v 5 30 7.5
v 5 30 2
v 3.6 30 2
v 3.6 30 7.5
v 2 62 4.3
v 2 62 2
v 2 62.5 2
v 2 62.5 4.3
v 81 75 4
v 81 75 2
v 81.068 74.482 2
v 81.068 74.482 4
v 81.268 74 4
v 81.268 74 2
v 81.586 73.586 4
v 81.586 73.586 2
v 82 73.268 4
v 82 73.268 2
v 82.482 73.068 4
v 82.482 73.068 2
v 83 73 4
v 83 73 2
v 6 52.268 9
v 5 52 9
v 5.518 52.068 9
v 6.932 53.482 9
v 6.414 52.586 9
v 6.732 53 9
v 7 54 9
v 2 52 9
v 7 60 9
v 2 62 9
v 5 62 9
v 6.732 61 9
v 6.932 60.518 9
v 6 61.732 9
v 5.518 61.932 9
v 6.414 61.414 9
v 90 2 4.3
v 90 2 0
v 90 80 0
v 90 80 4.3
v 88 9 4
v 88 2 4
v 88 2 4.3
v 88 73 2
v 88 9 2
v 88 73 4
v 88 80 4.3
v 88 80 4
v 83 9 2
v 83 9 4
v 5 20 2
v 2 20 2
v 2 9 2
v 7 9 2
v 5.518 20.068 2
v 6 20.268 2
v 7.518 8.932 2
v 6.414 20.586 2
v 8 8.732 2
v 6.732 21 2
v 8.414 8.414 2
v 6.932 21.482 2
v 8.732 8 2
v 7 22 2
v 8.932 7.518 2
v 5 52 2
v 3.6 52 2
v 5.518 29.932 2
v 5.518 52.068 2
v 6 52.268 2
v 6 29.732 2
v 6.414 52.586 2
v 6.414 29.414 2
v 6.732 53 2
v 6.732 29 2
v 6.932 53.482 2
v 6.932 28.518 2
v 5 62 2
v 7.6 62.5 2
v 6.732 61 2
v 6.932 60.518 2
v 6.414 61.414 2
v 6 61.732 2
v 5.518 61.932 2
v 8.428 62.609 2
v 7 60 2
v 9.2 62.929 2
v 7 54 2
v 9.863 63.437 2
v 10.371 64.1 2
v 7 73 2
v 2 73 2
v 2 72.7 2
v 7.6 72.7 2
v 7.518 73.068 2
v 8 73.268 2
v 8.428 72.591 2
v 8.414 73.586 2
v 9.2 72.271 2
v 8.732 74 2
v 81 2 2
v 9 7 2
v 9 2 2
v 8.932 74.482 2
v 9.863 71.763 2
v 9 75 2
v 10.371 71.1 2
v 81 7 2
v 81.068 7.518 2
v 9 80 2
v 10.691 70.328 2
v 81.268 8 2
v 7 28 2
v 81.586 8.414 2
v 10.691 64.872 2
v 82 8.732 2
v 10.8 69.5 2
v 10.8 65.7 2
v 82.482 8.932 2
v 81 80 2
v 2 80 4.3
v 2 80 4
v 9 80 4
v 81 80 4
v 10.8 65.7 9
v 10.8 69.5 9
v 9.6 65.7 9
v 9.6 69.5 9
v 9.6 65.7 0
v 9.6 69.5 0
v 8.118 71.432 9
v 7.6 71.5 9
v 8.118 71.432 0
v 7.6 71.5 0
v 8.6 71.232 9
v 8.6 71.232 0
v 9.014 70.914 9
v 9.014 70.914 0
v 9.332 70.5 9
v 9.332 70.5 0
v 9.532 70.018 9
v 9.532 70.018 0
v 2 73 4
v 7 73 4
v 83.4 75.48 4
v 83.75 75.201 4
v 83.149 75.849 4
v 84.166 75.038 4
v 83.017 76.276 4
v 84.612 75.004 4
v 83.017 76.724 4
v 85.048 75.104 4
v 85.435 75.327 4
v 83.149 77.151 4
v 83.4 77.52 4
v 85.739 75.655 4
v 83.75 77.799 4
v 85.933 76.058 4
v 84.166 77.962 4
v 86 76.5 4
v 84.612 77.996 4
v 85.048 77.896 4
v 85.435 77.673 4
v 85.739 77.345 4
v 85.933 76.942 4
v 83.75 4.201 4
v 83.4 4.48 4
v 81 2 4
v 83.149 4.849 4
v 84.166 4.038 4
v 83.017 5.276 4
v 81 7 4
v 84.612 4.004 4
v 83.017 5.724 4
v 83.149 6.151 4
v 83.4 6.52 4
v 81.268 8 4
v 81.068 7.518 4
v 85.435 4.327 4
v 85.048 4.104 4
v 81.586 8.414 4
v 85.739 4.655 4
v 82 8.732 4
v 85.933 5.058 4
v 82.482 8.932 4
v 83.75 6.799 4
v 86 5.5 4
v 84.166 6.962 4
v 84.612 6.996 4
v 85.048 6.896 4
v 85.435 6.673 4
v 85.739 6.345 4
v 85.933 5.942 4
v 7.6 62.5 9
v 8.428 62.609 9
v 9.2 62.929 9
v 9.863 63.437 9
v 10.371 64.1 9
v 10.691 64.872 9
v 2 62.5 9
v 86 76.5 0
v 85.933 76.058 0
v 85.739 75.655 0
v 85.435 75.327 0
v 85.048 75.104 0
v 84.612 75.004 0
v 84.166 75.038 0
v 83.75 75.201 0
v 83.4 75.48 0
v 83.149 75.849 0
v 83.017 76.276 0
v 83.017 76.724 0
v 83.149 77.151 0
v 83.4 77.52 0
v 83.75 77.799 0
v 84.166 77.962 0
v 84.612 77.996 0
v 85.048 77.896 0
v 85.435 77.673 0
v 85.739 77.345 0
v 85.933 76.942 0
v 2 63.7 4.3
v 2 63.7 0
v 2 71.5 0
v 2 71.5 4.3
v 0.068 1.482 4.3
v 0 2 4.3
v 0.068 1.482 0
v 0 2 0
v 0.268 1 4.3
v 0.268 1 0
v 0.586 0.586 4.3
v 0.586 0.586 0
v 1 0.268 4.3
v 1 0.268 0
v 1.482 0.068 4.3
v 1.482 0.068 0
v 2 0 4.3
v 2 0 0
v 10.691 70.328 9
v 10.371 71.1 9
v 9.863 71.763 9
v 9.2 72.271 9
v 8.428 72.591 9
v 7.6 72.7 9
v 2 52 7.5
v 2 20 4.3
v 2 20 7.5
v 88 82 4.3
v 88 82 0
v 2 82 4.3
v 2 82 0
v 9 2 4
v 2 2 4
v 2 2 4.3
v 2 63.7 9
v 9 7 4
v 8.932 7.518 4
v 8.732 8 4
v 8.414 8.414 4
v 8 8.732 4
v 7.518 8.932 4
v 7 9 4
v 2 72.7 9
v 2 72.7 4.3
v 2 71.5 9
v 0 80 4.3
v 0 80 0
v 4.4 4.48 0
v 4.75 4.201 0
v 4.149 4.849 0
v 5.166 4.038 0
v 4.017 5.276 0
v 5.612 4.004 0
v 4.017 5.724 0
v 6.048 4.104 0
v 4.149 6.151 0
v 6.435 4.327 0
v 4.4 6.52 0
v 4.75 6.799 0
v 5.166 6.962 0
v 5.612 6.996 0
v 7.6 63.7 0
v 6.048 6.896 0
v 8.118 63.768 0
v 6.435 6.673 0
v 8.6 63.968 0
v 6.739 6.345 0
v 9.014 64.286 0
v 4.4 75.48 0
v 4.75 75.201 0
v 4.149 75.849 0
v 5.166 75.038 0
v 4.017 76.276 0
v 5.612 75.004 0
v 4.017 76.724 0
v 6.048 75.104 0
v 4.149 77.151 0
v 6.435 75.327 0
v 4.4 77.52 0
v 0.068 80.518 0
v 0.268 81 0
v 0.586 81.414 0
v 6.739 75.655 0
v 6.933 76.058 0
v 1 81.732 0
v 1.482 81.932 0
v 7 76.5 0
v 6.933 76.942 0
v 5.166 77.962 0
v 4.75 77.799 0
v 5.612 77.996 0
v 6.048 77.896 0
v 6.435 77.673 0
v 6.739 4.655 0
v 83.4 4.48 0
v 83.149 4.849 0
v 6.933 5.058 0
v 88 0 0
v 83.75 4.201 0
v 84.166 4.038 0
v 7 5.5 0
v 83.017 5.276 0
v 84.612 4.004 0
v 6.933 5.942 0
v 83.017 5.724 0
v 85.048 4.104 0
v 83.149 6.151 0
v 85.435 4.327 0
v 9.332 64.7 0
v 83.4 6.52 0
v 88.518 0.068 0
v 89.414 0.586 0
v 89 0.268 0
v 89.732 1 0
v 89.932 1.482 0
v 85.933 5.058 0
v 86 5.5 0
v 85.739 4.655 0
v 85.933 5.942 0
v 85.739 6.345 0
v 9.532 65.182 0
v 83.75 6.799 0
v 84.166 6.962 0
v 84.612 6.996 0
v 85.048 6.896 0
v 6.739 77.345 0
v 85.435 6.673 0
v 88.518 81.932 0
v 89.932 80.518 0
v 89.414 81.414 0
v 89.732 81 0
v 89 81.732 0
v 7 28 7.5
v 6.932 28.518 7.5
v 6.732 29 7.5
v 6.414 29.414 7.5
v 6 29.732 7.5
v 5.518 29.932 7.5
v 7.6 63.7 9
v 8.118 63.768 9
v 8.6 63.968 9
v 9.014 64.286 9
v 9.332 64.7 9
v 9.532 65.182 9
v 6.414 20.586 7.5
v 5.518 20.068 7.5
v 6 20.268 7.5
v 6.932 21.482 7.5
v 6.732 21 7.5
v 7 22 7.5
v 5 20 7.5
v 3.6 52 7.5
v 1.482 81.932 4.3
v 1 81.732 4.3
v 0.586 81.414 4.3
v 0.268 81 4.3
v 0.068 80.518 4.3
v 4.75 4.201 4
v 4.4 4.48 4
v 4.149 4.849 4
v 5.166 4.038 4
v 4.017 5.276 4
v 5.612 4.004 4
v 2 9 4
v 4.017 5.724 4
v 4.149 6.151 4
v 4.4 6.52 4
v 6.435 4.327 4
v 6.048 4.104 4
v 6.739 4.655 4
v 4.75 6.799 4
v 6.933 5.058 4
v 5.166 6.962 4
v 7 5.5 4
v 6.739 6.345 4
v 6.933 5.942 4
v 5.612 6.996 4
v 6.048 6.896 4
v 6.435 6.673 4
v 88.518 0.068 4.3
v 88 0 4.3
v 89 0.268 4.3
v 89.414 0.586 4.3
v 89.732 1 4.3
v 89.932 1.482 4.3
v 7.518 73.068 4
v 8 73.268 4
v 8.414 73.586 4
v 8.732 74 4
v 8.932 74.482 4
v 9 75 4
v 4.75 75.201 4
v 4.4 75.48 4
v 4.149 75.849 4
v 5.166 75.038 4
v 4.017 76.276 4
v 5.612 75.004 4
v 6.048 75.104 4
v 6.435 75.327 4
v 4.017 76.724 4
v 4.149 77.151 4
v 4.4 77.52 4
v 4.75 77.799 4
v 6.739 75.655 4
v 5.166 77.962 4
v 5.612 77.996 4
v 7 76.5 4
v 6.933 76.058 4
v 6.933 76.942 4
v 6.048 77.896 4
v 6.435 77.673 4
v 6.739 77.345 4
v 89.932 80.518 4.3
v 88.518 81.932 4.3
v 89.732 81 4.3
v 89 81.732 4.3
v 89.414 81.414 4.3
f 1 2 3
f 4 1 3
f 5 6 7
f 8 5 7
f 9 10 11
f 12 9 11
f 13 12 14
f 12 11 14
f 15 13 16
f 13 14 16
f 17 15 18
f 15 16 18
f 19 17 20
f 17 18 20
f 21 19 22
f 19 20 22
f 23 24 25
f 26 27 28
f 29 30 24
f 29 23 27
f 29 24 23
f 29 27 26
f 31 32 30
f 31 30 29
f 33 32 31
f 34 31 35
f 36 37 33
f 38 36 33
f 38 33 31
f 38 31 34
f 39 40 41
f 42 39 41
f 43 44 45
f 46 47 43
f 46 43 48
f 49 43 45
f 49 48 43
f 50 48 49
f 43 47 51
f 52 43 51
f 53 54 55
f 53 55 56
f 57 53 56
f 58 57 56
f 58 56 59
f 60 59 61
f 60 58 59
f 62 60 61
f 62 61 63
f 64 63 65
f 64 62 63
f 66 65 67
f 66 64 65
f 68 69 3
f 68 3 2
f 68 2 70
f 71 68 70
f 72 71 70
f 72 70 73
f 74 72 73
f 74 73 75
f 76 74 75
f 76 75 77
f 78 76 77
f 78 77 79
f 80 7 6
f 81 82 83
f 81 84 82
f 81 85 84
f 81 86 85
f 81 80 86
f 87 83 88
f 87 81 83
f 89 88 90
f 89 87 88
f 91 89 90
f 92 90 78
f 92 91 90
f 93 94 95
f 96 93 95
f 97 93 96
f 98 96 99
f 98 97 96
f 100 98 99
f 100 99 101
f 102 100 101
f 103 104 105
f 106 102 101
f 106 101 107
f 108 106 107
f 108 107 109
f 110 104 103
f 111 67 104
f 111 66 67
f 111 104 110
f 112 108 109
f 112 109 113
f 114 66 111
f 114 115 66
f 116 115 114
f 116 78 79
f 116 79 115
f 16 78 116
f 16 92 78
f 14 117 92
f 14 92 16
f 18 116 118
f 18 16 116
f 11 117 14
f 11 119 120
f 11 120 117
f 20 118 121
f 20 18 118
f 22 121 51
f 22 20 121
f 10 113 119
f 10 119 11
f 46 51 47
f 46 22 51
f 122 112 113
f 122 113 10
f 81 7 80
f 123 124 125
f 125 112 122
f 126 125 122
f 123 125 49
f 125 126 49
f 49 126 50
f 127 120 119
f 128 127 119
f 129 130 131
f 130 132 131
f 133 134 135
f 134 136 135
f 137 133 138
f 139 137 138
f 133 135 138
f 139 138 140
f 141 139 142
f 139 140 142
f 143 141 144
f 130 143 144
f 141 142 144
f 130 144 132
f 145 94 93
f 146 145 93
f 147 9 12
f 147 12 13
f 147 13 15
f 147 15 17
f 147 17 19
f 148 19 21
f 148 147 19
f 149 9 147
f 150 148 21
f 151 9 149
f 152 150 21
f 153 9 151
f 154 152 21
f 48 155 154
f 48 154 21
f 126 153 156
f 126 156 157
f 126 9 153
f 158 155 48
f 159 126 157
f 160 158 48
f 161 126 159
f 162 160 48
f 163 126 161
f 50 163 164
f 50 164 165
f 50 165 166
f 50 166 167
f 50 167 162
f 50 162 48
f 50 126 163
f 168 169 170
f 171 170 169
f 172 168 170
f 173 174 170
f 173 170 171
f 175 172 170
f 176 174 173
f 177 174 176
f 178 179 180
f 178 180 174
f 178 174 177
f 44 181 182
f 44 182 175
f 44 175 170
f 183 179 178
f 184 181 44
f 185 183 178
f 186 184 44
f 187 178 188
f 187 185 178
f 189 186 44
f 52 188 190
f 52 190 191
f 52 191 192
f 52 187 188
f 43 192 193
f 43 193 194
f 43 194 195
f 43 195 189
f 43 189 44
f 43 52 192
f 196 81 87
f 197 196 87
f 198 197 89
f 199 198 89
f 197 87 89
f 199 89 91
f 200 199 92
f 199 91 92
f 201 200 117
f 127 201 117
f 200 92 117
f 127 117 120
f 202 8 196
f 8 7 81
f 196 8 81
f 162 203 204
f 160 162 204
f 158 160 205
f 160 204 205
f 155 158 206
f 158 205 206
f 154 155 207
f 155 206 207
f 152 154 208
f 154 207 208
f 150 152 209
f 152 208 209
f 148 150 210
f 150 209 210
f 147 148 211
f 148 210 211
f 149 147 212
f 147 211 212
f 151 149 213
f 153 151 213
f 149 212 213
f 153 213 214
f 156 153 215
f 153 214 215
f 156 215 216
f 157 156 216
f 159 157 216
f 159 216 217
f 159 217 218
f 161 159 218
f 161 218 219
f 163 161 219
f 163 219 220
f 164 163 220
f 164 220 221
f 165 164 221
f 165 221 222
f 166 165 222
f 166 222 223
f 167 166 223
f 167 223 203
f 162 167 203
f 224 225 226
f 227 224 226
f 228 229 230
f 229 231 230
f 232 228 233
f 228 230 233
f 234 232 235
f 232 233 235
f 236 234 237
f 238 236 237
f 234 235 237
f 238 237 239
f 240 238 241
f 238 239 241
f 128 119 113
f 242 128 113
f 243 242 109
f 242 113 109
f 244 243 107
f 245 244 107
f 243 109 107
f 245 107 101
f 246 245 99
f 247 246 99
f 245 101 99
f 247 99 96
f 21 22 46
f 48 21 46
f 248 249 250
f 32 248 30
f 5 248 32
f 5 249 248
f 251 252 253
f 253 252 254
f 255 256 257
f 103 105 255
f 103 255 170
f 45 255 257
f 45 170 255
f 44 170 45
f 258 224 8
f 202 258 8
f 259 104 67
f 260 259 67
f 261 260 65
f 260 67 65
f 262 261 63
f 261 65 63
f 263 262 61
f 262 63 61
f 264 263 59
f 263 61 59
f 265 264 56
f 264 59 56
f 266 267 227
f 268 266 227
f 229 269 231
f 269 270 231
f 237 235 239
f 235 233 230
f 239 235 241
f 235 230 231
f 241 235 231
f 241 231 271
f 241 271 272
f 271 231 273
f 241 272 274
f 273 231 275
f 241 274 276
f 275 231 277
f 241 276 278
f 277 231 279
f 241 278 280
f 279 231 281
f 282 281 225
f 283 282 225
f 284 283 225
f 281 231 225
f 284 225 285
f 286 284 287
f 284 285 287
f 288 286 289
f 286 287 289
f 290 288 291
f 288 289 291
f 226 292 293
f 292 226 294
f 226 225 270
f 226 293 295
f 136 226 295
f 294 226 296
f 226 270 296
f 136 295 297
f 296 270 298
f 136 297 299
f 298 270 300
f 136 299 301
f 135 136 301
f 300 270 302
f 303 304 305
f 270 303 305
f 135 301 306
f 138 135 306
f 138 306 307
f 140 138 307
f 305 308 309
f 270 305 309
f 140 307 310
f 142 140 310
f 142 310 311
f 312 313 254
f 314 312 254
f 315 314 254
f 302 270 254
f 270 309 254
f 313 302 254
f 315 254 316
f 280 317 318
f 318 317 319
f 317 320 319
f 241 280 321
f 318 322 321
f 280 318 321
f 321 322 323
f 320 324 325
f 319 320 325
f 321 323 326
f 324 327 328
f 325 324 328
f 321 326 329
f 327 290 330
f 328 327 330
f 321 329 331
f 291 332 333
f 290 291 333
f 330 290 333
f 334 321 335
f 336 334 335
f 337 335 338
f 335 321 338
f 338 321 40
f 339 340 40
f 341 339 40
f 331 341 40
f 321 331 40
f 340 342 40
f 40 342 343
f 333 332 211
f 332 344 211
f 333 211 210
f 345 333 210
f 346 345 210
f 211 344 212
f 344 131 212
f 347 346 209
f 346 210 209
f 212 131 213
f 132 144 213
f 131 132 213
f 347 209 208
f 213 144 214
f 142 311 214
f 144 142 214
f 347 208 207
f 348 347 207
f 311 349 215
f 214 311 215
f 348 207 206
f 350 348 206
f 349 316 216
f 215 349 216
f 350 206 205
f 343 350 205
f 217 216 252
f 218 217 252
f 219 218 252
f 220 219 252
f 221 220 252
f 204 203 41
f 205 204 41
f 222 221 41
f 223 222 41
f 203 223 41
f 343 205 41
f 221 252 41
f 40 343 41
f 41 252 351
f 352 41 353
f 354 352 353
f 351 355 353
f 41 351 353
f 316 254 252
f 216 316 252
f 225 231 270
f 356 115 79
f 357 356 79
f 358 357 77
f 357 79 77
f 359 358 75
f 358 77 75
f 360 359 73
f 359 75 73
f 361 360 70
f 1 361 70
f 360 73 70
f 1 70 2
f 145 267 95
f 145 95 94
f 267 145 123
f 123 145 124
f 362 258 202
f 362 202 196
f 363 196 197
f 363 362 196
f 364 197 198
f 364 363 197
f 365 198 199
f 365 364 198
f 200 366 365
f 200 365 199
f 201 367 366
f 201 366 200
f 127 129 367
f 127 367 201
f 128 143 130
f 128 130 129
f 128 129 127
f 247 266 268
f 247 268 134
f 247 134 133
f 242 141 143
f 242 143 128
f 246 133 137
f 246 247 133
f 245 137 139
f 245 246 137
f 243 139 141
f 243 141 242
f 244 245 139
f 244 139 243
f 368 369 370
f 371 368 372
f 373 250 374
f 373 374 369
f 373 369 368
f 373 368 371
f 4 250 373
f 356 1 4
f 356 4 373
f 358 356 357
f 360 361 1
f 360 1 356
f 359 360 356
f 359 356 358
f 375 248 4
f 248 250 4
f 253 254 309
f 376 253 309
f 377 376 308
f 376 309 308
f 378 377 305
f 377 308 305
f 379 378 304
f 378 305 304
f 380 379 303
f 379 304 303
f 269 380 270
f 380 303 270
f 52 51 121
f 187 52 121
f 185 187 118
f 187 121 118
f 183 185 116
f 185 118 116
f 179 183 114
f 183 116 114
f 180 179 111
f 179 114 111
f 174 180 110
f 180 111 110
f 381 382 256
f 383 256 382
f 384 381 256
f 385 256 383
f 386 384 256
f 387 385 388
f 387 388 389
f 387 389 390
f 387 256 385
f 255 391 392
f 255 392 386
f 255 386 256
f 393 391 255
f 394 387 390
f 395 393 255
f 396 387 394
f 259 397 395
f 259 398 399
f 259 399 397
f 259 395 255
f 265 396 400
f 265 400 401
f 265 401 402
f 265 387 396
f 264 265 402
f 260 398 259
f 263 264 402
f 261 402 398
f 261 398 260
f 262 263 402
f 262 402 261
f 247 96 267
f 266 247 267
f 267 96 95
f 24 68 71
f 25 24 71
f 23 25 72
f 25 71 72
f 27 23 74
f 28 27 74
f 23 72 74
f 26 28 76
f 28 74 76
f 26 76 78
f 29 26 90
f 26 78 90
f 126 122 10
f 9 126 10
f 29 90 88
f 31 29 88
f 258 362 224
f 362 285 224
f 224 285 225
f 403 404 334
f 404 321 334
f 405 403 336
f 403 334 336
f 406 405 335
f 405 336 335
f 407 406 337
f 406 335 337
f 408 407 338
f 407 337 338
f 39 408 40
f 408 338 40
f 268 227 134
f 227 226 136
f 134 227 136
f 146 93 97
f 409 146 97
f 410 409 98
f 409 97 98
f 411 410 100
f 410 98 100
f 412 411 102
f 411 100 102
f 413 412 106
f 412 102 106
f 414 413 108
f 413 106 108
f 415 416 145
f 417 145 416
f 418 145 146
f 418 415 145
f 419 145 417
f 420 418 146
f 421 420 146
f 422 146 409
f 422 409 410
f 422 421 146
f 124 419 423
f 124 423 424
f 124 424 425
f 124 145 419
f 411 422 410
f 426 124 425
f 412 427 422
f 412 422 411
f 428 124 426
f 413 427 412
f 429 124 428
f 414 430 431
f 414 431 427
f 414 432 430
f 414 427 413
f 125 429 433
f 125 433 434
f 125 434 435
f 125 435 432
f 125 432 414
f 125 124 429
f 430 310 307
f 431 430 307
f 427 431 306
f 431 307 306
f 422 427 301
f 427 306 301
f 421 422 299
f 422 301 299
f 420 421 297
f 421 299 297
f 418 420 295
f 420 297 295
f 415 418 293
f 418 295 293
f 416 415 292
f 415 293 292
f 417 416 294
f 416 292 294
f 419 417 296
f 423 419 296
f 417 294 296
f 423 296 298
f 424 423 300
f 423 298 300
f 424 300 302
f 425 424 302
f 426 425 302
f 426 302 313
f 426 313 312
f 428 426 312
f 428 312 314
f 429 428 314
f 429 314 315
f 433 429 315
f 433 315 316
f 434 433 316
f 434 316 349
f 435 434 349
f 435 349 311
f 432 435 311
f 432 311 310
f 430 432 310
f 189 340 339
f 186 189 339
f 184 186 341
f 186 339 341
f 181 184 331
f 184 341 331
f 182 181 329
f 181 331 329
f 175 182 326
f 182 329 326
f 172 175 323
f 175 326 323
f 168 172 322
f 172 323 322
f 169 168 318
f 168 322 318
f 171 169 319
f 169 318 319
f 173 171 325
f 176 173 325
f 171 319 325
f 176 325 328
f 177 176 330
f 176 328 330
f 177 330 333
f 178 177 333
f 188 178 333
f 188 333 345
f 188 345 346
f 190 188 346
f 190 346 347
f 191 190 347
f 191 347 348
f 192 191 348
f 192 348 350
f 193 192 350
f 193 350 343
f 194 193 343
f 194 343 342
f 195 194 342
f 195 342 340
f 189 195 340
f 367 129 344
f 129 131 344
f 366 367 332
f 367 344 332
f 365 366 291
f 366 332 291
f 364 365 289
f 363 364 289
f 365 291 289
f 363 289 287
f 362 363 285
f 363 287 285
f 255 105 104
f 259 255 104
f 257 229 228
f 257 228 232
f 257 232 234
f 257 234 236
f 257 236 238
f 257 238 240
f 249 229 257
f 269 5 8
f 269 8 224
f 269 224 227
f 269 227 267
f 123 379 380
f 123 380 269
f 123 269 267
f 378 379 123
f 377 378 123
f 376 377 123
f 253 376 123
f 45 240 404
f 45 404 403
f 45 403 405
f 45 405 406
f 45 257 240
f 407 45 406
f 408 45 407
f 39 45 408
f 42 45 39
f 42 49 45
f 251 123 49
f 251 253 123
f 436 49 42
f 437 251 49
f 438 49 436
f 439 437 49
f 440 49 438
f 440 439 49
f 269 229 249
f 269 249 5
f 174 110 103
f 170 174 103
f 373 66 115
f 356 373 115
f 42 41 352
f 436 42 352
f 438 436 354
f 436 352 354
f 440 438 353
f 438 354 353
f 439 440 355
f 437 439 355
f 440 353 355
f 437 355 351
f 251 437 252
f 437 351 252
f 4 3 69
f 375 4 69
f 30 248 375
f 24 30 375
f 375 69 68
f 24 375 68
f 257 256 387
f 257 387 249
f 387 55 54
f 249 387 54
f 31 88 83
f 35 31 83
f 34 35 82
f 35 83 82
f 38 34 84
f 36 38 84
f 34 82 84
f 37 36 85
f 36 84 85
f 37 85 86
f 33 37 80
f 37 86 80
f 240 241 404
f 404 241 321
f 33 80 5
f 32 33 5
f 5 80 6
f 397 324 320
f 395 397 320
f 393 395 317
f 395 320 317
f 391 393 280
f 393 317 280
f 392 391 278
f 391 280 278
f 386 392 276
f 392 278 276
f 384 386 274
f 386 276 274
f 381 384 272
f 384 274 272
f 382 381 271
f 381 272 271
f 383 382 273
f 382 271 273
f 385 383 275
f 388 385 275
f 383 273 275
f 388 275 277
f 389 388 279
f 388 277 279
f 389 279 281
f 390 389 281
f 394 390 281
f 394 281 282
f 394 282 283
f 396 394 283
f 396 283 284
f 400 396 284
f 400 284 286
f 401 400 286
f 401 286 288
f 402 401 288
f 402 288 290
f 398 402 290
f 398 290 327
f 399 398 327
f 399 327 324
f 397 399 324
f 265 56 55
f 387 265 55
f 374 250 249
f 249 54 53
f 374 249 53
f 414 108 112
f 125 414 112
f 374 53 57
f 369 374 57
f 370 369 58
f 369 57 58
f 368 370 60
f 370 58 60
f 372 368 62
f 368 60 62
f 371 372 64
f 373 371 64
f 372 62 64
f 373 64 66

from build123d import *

# Parameters (mm, degrees)
F1_DEPTH  = 2
F2_W      = 86
F2_H      = 78
F3_DEPTH  = 2.3
F5_DEPTH  = 2
F6_R      = 1.5
F7_DEPTH  = 6
F9_DEPTH  = 7
F11_DEPTH = 5.5
F13_DEPTH = 25
F15_DEPTH = 7
F16_W     = 1.6
F16_H     = 22
F17_DEPTH = 5.5


with BuildPart() as f1:
    # F0 (on Top) → F1 (new body)
    with BuildSketch(Plane.XY):
        with BuildLine():
            ThreePointArc((0, 2), (0.585786, 0.585786), (2, 0))
            Line((2, 0), (88, 0))
            ThreePointArc((88, 0), (89.414214, 0.585786), (90, 2))
            Line((90, 2), (90, 80))
            ThreePointArc((90, 80), (89.414214, 81.414214), (88, 82))
            Line((88, 82), (2, 82))
            ThreePointArc((2, 82), (0.585786, 81.414214), (0, 80))
            Line((0, 80), (0, 2))
        make_face()
    extrude(amount=F1_DEPTH)

    # F2 (on face) → F3 (join)
    with BuildSketch(Plane.XY.offset(2)):
        with BuildLine():
            ThreePointArc((2, 82), (0.585786, 81.414214), (0, 80))
            Line((0, 80), (0, 2))
            ThreePointArc((0, 2), (0.585786, 0.585786), (2, 0))
            Line((2, 0), (88, 0))
            ThreePointArc((88, 0), (89.414214, 0.585786), (90, 2))
            Line((90, 2), (90, 80))
            ThreePointArc((90, 80), (89.414214, 81.414214), (88, 82))
            Line((88, 82), (2, 82))
        make_face()
        with Locations((45, 41)):
            Rectangle(F2_W, F2_H, mode=Mode.SUBTRACT)
    extrude(amount=F3_DEPTH)

    # F4 (on face) → F5 (join)
    with BuildSketch(Plane.XY.offset(2)):
        with BuildLine():
            Line((2, 9), (2, 2))
            Line((2, 2), (9, 2))
            Line((9, 2), (9, 7))
            ThreePointArc((9, 7), (8.414214, 8.414214), (7, 9))
            Line((7, 9), (2, 9))
        make_face()
        with BuildLine():
            Line((9, 80), (2, 80))
            Line((2, 80), (2, 73))
            Line((2, 73), (7, 73))
            ThreePointArc((7, 73), (8.414214, 73.585786), (9, 75))
            Line((9, 75), (9, 80))
        make_face()
        with BuildLine():
            Line((81, 2), (88, 2))
            Line((88, 2), (88, 9))
            Line((88, 9), (83, 9))
            ThreePointArc((83, 9), (81.585786, 8.414214), (81, 7))
            Line((81, 7), (81, 2))
        make_face()
        with BuildLine():
            Line((88, 73), (88, 80))
            Line((88, 80), (81, 80))
            Line((81, 80), (81, 75))
            ThreePointArc((81, 75), (81.585786, 73.585786), (83, 73))
            Line((83, 73), (88, 73))
        make_face()
    extrude(amount=F5_DEPTH)

    # F6 (on face) → F7 (cut)
    with BuildSketch(Plane(origin=(0, 0, 0), x_dir=(1, 0, 0), z_dir=(0, 0, -1))):
        with Locations((84.5, -5.5)):
            Circle(F6_R)
        with Locations((84.5, -76.5)):
            Circle(F6_R)
        with Locations((5.5, -76.5)):
            Circle(F6_R)
        with Locations((5.5, -5.5)):
            Circle(F6_R)
    extrude(amount=-F7_DEPTH, mode=Mode.SUBTRACT)

    # F8 (on face) → F9 (join)
    with BuildSketch(Plane.XY.offset(2)):
        with BuildLine():
            Line((5, 62), (2, 62))
            Line((2, 62), (2, 52))
            Line((2, 52), (5, 52))
            ThreePointArc((5, 52), (6.414214, 52.585786), (7, 54))
            Line((7, 54), (7, 60))
            ThreePointArc((7, 60), (6.414214, 61.414214), (5, 62))
        make_face()
    extrude(amount=F9_DEPTH)

    # F10 (on face) → F11 (join)
    with BuildSketch(Plane.XY.offset(2)):
        with BuildLine():
            Line((2, 30), (2, 20))
            Line((2, 20), (5, 20))
            ThreePointArc((5, 20), (6.414214, 20.585786), (7, 22))
            Line((7, 22), (7, 28))
            ThreePointArc((7, 28), (6.414214, 29.414214), (5, 30))
            Line((5, 30), (2, 30))
        make_face()
    extrude(amount=F11_DEPTH)

    # F12 (on face) → F13 (cut)
    with BuildSketch(Plane(origin=(0, 0, 0), x_dir=(1, 0, 0), z_dir=(0, 0, -1))):
        with BuildLine():
            Line((2, -63.7), (2, -71.5))
            Line((2, -71.5), (7.6, -71.5))
            ThreePointArc((7.6, -71.5), (9.014214, -70.914214), (9.6, -69.5))
            Line((9.6, -69.5), (9.6, -65.7))
            ThreePointArc((9.6, -65.7), (9.014214, -64.285786), (7.6, -63.7))
            Line((7.6, -63.7), (2, -63.7))
        make_face()
    extrude(amount=-F13_DEPTH, mode=Mode.SUBTRACT)

    # F14 (on face) → F15 (join)
    with BuildSketch(Plane.XY.offset(2)):
        with BuildLine():
            ThreePointArc((10.8, 69.5), (9.862742, 71.762742), (7.6, 72.7))
            Line((7.6, 72.7), (2, 72.7))
            Line((2, 72.7), (2, 71.5))
            Line((2, 71.5), (7.6, 71.5))
            ThreePointArc((7.6, 71.5), (9.014214, 70.914214), (9.6, 69.5))
            Line((9.6, 69.5), (9.6, 65.7))
            ThreePointArc((9.6, 65.7), (9.014214, 64.285786), (7.6, 63.7))
            Line((7.6, 63.7), (2, 63.7))
            Line((2, 63.7), (2, 62.5))
            Line((2, 62.5), (7.6, 62.5))
            ThreePointArc((7.6, 62.5), (9.862742, 63.437258), (10.8, 65.7))
            Line((10.8, 65.7), (10.8, 69.5))
        make_face()
    extrude(amount=F15_DEPTH)

    # F16 (on face) → F17 (join)
    with BuildSketch(Plane.XY.offset(2)):
        with Locations((2.8, 41)):
            Rectangle(F16_W, F16_H)
    extrude(amount=F17_DEPTH)


solid = f1.part
